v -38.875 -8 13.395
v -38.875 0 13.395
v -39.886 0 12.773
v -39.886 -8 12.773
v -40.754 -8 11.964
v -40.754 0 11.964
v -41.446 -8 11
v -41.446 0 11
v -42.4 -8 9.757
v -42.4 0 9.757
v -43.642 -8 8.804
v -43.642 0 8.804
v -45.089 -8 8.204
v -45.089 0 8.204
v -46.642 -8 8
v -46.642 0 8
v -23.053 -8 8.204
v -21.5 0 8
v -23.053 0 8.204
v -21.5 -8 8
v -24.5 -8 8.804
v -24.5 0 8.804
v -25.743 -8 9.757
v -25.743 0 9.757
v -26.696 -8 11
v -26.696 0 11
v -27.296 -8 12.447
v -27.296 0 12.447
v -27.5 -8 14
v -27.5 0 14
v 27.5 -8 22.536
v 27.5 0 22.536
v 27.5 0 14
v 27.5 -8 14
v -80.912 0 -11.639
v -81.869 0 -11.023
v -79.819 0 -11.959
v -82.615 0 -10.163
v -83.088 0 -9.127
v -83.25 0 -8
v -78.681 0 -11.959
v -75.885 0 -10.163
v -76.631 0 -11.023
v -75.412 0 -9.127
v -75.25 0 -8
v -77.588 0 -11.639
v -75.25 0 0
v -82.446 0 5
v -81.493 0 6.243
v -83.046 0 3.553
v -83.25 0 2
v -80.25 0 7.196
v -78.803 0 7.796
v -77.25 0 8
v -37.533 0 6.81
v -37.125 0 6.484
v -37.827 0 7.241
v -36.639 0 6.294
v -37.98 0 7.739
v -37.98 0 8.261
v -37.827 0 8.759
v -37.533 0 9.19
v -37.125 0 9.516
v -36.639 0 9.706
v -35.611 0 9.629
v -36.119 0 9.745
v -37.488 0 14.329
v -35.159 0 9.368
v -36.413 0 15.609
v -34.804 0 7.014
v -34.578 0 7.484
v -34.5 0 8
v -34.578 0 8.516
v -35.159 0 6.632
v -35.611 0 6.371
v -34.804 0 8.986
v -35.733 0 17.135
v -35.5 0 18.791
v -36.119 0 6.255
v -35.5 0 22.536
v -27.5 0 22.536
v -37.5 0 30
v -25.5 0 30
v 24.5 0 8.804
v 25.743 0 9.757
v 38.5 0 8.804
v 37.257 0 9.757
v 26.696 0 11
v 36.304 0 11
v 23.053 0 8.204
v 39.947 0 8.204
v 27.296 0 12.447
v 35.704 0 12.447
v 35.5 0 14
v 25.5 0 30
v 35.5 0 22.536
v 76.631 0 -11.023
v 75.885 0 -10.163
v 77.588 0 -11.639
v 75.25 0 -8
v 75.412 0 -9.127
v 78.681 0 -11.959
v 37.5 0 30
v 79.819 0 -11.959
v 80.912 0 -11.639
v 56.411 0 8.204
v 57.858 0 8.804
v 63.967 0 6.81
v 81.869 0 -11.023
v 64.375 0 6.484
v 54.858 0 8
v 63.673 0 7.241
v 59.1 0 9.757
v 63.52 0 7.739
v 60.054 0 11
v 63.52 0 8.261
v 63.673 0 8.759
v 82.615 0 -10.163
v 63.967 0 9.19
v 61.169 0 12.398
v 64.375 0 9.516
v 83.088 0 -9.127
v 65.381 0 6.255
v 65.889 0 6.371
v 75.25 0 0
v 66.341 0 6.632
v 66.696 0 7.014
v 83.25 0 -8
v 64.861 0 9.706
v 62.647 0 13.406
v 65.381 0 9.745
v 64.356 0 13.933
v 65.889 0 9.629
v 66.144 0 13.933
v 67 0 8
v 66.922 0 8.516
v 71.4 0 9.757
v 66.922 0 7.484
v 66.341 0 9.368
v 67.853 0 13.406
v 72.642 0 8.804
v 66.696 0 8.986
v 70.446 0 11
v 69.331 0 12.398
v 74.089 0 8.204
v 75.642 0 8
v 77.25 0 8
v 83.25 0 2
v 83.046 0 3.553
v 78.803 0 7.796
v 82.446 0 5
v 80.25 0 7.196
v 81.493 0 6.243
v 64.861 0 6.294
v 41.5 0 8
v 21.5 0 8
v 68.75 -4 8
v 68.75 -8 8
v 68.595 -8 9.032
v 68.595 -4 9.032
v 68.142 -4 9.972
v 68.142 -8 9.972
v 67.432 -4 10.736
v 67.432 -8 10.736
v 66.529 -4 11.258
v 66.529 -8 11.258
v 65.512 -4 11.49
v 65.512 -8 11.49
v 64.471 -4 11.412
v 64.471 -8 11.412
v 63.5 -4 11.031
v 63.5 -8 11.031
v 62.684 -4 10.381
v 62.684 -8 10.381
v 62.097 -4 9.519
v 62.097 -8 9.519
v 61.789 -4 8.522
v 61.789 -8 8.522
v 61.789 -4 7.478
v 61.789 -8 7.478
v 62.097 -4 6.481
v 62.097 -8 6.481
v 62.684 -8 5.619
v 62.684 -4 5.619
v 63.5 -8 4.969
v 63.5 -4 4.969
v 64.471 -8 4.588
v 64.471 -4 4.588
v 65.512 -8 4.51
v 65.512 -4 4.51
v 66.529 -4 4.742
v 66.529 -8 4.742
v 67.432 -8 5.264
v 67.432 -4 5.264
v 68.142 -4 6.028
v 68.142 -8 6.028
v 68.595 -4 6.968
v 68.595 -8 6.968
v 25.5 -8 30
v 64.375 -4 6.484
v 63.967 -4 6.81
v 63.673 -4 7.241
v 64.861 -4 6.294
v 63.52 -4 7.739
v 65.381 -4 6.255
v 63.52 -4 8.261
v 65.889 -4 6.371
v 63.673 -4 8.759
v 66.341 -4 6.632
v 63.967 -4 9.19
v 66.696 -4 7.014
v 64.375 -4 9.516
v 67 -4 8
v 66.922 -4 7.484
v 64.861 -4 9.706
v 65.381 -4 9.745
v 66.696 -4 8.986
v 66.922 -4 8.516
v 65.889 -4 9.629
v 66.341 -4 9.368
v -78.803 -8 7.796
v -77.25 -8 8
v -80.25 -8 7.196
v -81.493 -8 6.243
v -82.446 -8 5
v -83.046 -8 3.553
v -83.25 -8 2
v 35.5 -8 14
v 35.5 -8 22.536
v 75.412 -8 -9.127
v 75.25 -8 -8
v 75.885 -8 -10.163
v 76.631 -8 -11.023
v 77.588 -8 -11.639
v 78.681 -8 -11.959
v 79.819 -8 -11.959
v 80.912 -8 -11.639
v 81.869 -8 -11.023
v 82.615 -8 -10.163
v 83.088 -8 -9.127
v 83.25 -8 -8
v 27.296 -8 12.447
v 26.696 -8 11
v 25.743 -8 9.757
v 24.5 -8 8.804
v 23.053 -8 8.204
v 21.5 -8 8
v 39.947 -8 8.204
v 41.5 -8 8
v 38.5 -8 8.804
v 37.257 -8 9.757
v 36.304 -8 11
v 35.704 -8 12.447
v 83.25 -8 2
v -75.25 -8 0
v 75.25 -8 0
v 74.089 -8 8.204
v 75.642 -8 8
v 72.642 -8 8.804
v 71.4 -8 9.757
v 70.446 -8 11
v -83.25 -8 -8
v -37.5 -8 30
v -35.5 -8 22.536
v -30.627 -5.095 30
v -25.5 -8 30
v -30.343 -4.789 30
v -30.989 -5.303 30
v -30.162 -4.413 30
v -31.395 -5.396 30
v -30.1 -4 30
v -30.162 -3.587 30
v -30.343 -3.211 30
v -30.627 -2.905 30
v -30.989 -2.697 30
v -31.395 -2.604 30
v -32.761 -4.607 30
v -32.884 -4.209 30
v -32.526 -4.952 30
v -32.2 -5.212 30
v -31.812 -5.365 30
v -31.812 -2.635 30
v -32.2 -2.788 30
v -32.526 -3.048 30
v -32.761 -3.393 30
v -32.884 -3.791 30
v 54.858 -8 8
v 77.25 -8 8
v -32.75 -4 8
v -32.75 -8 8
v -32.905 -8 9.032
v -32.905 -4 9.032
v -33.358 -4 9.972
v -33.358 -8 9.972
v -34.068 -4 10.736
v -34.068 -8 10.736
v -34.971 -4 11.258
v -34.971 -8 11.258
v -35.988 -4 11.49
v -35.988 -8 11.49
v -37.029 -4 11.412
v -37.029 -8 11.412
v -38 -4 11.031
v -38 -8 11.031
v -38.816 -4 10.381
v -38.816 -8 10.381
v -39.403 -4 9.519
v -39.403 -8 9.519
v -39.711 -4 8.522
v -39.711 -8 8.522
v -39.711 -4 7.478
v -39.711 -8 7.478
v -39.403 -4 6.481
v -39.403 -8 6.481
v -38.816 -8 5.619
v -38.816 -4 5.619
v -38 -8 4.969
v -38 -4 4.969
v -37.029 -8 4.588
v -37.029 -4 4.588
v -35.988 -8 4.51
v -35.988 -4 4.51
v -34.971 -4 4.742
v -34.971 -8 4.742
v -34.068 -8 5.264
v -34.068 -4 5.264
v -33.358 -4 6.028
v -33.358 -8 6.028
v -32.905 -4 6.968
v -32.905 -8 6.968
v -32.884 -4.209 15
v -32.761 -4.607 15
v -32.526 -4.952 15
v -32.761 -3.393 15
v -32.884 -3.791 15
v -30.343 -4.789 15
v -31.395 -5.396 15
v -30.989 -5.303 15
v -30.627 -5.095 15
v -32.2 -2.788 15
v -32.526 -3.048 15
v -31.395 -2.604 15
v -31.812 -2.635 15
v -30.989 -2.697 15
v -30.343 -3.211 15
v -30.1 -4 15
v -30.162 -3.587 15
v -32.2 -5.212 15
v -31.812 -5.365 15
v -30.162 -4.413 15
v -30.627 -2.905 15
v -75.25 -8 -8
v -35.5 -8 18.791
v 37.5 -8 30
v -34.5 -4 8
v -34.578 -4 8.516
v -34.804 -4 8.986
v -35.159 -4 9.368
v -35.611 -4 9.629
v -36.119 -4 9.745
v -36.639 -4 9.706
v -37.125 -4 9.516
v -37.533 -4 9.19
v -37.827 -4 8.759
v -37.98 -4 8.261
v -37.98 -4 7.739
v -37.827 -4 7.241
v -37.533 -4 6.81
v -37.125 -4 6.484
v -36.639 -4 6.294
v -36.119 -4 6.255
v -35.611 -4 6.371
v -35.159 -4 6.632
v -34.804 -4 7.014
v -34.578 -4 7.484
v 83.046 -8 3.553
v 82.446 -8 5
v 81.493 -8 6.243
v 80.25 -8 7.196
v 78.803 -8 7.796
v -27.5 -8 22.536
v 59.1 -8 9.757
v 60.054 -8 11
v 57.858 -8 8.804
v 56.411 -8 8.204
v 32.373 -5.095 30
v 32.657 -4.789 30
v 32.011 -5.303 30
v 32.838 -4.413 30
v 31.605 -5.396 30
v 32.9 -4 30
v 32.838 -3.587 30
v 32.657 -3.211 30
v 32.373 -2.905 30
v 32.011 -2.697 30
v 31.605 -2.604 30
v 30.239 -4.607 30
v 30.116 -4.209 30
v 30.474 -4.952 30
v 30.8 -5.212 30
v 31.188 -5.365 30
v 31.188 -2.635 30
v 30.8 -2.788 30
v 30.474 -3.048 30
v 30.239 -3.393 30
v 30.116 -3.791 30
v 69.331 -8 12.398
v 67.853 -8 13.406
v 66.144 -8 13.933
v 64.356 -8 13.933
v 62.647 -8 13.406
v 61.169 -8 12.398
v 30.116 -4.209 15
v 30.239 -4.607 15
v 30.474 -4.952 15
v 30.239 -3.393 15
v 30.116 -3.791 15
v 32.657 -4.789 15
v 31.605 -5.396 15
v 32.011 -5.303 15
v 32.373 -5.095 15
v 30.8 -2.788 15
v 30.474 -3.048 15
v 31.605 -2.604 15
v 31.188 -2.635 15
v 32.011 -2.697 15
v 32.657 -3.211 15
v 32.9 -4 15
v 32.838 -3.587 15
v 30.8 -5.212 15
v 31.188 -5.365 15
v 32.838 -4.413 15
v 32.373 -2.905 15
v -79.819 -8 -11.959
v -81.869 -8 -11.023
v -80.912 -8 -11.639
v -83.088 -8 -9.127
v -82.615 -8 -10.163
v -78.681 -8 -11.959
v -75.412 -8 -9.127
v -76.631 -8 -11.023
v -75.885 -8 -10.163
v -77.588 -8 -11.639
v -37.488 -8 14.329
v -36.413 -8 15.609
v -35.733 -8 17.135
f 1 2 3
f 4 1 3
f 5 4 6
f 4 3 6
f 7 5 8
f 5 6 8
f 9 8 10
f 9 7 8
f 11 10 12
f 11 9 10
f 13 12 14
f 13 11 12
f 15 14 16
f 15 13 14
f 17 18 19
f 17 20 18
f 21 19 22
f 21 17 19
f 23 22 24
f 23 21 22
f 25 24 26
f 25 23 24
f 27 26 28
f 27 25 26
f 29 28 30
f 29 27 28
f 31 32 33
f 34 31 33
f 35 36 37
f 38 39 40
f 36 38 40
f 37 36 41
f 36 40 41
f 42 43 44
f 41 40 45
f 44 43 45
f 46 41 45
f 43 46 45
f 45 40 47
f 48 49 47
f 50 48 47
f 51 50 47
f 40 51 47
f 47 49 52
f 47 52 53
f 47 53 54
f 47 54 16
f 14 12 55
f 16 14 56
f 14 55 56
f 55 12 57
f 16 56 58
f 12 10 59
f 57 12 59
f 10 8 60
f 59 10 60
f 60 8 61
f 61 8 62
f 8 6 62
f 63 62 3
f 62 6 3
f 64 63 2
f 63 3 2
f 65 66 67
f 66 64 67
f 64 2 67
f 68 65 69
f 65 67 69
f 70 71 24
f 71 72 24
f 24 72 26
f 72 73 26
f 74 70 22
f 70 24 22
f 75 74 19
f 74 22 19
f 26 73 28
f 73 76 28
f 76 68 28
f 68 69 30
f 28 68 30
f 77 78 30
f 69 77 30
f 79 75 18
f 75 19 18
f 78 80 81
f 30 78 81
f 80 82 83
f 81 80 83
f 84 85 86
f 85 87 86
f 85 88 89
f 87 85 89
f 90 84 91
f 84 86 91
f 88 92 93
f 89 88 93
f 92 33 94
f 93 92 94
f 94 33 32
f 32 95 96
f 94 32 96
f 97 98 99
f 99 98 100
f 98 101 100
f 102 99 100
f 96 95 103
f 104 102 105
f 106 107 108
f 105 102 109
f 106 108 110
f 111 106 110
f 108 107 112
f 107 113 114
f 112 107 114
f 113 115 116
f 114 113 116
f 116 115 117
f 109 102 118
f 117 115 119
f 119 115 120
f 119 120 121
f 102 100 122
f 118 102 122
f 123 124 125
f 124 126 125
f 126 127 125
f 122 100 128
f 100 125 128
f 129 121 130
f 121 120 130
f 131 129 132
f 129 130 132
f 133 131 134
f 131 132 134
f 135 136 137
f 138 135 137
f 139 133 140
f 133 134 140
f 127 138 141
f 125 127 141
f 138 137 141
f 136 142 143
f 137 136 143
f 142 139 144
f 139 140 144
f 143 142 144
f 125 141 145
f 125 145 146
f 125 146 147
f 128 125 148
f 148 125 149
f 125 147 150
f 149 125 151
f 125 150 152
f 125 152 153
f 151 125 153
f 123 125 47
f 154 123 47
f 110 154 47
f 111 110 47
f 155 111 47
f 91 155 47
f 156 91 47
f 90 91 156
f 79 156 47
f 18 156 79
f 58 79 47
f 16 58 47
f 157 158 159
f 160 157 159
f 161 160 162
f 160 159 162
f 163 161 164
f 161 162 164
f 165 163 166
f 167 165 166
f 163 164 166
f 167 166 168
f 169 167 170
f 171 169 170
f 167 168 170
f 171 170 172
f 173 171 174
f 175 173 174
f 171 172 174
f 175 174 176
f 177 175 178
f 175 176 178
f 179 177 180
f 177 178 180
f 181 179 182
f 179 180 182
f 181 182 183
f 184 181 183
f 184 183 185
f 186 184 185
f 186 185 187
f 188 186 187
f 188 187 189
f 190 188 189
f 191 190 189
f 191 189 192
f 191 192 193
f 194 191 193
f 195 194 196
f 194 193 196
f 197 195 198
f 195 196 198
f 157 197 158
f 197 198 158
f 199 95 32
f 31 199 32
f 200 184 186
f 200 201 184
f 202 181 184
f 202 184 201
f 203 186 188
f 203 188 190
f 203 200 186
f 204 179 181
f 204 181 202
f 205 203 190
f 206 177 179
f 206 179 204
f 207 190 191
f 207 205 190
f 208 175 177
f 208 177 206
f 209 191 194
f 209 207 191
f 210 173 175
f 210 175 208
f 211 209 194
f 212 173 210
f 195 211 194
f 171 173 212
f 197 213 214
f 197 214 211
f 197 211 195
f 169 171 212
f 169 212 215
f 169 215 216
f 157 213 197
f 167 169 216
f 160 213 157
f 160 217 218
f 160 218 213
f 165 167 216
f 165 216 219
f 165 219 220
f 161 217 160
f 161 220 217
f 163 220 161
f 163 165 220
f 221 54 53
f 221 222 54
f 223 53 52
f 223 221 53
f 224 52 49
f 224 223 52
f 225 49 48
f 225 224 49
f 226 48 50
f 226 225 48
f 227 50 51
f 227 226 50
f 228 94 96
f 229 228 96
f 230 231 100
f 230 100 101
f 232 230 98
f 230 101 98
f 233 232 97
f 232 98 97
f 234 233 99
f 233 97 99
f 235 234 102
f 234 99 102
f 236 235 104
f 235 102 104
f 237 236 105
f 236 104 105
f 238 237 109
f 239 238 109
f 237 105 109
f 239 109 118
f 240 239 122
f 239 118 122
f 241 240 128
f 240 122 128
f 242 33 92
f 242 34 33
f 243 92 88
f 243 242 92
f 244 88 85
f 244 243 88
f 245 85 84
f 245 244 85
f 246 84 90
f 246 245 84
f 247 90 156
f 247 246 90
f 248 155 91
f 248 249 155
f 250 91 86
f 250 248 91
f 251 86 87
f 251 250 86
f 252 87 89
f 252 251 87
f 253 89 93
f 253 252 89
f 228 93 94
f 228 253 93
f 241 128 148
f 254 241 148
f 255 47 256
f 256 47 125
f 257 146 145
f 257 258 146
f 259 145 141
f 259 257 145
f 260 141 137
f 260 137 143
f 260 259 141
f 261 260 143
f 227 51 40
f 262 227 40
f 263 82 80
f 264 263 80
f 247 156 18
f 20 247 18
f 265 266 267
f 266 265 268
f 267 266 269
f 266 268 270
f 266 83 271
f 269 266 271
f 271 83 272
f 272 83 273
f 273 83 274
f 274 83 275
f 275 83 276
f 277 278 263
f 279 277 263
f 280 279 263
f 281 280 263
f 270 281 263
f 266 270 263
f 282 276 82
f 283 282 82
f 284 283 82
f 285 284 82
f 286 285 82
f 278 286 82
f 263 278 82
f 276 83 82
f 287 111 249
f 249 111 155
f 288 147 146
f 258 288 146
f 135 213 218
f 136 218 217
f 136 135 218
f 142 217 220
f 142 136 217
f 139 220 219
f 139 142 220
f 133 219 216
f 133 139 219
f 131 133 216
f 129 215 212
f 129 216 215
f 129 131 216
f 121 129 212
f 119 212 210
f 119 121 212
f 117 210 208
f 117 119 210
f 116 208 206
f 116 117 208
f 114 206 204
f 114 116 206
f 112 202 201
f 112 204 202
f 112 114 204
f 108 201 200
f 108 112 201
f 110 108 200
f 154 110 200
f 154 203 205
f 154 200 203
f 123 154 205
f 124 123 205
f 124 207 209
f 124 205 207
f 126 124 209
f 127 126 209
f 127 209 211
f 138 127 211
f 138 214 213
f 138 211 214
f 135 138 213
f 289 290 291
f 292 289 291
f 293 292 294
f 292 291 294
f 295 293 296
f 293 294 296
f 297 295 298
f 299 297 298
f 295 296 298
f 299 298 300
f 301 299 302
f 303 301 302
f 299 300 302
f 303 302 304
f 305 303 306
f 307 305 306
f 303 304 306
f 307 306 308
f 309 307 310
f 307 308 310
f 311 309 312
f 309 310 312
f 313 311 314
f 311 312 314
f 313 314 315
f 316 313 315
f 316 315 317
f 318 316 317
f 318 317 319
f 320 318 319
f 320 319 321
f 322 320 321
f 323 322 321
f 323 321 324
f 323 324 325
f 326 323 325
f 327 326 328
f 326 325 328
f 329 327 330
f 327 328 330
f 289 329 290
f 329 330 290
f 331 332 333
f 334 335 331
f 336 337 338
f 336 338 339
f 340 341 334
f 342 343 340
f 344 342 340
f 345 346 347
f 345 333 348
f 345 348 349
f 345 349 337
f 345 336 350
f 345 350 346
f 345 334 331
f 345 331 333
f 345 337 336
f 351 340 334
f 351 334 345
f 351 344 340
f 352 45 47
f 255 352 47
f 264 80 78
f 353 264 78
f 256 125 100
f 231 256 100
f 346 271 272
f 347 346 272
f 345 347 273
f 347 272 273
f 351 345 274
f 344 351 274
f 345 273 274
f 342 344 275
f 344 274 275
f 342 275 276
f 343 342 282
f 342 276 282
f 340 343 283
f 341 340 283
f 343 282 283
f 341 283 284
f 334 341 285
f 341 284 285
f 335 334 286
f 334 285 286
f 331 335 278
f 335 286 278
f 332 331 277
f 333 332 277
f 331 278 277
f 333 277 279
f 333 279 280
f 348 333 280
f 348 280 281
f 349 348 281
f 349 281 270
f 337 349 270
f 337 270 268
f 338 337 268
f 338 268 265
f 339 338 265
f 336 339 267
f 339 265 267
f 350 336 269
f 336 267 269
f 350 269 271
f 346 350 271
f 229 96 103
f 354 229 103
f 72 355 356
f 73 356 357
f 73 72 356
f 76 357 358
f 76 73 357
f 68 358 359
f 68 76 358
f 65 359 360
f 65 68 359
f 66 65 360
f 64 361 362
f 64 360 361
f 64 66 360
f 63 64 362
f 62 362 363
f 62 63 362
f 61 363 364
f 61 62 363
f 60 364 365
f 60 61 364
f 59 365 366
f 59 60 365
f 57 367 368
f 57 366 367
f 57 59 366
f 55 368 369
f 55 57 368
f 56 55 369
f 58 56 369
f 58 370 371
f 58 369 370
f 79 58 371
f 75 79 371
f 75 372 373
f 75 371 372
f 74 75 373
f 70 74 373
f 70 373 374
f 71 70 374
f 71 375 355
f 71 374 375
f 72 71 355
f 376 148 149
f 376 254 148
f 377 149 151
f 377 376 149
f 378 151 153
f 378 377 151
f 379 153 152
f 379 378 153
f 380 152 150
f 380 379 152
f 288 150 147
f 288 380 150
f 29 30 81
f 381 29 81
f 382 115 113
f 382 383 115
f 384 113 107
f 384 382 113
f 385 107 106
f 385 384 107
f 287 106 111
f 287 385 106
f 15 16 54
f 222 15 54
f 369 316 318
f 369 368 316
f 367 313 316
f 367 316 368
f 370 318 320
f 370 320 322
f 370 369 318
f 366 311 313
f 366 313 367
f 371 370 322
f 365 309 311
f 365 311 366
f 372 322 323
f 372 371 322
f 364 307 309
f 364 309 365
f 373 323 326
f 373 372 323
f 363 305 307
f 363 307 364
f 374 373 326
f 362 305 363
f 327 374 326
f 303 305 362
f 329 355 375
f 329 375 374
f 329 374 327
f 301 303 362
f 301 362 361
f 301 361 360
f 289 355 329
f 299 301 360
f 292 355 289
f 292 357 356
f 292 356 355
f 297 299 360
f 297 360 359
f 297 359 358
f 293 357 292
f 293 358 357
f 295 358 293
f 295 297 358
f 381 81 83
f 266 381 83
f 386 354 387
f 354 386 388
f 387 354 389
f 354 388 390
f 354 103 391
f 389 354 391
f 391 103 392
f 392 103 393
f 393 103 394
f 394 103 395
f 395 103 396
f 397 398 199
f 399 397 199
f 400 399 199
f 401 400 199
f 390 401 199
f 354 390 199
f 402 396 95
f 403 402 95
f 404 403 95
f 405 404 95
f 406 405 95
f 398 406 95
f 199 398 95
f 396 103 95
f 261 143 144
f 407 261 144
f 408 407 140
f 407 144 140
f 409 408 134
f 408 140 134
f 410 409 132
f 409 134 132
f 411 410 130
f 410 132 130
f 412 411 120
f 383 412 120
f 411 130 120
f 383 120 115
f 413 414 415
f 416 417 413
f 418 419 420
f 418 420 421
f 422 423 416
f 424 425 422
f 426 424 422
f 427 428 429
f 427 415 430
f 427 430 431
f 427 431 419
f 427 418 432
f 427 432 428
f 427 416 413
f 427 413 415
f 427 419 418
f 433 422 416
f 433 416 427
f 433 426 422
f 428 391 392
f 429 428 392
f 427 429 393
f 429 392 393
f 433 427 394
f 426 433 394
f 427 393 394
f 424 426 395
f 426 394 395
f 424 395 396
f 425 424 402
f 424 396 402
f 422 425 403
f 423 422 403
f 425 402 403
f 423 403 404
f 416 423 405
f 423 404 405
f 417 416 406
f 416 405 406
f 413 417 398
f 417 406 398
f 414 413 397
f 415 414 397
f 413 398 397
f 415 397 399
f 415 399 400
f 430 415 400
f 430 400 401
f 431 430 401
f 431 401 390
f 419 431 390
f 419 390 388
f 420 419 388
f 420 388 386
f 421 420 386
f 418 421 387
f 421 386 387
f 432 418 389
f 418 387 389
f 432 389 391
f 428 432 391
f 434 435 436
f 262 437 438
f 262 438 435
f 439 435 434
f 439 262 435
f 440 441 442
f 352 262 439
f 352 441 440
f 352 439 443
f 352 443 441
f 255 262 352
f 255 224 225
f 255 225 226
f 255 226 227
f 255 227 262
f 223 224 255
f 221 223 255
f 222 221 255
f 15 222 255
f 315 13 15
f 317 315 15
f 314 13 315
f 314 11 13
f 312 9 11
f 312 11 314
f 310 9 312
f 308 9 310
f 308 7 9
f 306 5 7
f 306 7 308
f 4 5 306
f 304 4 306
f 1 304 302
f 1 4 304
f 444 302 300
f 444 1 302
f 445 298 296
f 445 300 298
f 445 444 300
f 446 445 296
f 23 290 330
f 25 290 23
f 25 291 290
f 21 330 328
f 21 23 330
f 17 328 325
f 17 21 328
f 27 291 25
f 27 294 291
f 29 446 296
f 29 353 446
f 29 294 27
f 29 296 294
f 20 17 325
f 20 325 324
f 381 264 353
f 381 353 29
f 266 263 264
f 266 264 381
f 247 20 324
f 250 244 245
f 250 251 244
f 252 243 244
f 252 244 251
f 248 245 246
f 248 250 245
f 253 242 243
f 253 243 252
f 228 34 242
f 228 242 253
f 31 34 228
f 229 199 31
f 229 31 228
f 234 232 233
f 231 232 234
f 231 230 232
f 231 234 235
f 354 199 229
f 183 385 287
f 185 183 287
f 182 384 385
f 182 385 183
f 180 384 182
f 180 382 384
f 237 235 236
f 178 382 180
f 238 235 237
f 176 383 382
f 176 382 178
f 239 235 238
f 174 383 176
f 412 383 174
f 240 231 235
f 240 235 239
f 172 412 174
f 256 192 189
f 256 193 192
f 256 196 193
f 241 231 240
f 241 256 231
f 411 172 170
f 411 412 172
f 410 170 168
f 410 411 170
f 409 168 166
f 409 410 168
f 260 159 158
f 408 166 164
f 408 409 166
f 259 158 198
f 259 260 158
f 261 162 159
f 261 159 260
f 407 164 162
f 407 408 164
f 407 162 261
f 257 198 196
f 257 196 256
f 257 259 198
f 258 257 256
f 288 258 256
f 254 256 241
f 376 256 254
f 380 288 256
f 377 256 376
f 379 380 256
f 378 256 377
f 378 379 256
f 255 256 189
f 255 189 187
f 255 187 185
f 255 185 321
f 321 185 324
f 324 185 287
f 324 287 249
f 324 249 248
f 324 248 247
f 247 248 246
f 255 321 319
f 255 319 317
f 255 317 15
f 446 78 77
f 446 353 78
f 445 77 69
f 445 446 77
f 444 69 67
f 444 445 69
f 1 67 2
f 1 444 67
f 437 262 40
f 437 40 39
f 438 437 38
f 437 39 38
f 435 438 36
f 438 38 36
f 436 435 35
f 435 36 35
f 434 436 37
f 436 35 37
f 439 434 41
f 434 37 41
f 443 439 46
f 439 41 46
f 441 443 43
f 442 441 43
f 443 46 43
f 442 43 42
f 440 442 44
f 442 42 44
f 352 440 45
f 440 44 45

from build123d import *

# Parameters (mm, degrees)
F0_R     = 1.75
F1_DEPTH = 8
F2_R     = 6
F3_R     = 3.5
F4_DEPTH = 4
F5_R     = 1.4
F6_DEPTH = 15
F7_R     = 1.4
F8_DEPTH = 15


# Not quite as in the source:
# - a feature names something its author has since deleted; it is built from what else it names


with BuildPart() as f1:
    # F0 (on Front) → F1 (new body)
    with BuildSketch(Plane.XZ):
        with BuildLine():
            Line((-75.25, 0), (0, 0))
            Line((0, 0), (75.25, 0))
            Line((75.25, 0), (75.25, -8))
            ThreePointArc((75.25, -8), (79.25, -12), (83.25, -8))
            Line((83.25, -8), (83.25, 8))
            Line((83.25, 8), (71.25, 8))
            ThreePointArc((71.25, 8), (65.25, 14), (59.25, 8))
            Line((59.25, 8), (35.5, 8))
            Line((35.5, 8), (35.5, 22.5358983849))
            Line((35.5, 22.5358983849), (35.5, 30))
            Line((35.5, 30), (27.5, 30))
            Line((27.5, 30), (27.5, 22.5358983849))
            Line((27.5, 22.5358983849), (27.5, 8))
            Line((27.5, 8), (0, 8))
            Line((0, 8), (-27.5, 8))
            Line((-27.5, 8), (-27.5, 22.5358983849))
            Line((-27.5, 22.5358983849), (-27.5, 30))
            Line((-27.5, 30), (-35.5, 30))
            Line((-35.5, 30), (-35.5, 22.5358983849))
            Line((-35.5, 22.5358983849), (-35.5, 13.9529404499))
            ThreePointArc((-35.5, 13.9529404499), (-40.2186269666, 12.5), (-42.25, 8))
            Line((-42.25, 8), (-83.25, 8))
            Line((-83.25, 8), (-83.25, -8))
            ThreePointArc((-83.25, -8), (-79.25, -12), (-75.25, -8))
            Line((-75.25, -8), (-75.25, 0))
        make_face()
        with Locations((-36.25, 8)):
            Circle(F0_R, mode=Mode.SUBTRACT)
        with Locations((65.25, 8)):
            Circle(F0_R, mode=Mode.SUBTRACT)
        Polygon((-37.5, 30), (-35.5, 22.5358983849), (-35.5, 30), align=None)
        Polygon((-25.5, 30), (-27.5, 30), (-27.5, 22.5358983849), align=None)
        Polygon((27.5, 22.5358983849), (27.5, 30), (25.5, 30), align=None)
        Polygon((35.5, 30), (35.5, 22.5358983849), (37.5, 30), align=None)
    extrude(amount=F1_DEPTH)

    # F2
    f2_edges = [f1.edges().sort_by_distance(p)[0] for p in [
        (59.25, -4, 8),
        (71.25, -4, 8),
        (83.25, -4, 8),
        (-83.25, -4, 8),
        (-35.5, -4, 13.95294),
        (-27.5, -4, 8),
        (27.5, -4, 8),
        (35.5, -4, 8),
        (-42.25, -4, 8),
    ]]
    fillet(f2_edges, radius=F2_R)

    # F3 (on face) → F4 (cut)
    with BuildSketch(Plane.XZ.offset(8)):
        with Locations((-36.25, 8)):
            Circle(F3_R)
        with Locations((65.25, 8)):
            Circle(F3_R)
    extrude(amount=-F4_DEPTH, mode=Mode.SUBTRACT)

    # F5 (on face) → F6 (cut)
    with BuildSketch(Plane.XY.offset(30)):
        with Locations((-31.5, -4)):
            Circle(F5_R)
    extrude(amount=-F6_DEPTH, mode=Mode.SUBTRACT)

    # F7 (on face) → F8 (cut)
    with BuildSketch(Plane.XY.offset(30)):
        with Locations((31.5, -4)):
            Circle(F7_R)
    extrude(amount=-F8_DEPTH, mode=Mode.SUBTRACT)


solid = f1.part
